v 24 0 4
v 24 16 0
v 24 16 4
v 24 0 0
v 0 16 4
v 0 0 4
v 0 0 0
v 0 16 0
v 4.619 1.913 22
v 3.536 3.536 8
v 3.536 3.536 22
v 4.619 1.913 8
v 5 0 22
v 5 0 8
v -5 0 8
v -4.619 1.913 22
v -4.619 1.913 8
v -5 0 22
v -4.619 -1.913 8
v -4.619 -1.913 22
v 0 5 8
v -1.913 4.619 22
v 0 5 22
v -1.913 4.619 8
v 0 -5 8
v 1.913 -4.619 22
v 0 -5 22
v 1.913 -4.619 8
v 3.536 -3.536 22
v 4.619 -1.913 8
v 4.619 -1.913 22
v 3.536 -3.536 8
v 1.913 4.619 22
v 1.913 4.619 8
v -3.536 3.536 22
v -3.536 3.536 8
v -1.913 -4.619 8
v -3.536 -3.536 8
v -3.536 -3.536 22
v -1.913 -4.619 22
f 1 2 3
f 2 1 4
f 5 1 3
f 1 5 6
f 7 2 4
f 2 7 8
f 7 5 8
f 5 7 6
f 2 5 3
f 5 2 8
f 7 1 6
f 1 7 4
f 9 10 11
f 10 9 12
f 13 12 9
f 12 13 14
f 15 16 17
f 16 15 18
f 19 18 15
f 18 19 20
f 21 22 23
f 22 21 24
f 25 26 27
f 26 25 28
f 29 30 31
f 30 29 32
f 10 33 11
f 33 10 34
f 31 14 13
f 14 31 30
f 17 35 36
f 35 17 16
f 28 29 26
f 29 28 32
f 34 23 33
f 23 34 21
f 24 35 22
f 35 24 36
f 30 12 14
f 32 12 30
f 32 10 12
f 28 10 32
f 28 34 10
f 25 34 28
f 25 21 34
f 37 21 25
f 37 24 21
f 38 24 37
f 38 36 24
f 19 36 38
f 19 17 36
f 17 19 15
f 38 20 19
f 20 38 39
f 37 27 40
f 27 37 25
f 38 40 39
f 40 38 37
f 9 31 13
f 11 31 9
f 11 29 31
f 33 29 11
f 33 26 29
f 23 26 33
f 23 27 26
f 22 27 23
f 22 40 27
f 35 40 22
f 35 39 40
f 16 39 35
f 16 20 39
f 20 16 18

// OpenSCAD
// OpenSCAD Parametric Bracket
translate([0, 0, 0]) cube([24, 16, 4]);
translate([0, 0, 8]) cylinder(r=5, h=14);
